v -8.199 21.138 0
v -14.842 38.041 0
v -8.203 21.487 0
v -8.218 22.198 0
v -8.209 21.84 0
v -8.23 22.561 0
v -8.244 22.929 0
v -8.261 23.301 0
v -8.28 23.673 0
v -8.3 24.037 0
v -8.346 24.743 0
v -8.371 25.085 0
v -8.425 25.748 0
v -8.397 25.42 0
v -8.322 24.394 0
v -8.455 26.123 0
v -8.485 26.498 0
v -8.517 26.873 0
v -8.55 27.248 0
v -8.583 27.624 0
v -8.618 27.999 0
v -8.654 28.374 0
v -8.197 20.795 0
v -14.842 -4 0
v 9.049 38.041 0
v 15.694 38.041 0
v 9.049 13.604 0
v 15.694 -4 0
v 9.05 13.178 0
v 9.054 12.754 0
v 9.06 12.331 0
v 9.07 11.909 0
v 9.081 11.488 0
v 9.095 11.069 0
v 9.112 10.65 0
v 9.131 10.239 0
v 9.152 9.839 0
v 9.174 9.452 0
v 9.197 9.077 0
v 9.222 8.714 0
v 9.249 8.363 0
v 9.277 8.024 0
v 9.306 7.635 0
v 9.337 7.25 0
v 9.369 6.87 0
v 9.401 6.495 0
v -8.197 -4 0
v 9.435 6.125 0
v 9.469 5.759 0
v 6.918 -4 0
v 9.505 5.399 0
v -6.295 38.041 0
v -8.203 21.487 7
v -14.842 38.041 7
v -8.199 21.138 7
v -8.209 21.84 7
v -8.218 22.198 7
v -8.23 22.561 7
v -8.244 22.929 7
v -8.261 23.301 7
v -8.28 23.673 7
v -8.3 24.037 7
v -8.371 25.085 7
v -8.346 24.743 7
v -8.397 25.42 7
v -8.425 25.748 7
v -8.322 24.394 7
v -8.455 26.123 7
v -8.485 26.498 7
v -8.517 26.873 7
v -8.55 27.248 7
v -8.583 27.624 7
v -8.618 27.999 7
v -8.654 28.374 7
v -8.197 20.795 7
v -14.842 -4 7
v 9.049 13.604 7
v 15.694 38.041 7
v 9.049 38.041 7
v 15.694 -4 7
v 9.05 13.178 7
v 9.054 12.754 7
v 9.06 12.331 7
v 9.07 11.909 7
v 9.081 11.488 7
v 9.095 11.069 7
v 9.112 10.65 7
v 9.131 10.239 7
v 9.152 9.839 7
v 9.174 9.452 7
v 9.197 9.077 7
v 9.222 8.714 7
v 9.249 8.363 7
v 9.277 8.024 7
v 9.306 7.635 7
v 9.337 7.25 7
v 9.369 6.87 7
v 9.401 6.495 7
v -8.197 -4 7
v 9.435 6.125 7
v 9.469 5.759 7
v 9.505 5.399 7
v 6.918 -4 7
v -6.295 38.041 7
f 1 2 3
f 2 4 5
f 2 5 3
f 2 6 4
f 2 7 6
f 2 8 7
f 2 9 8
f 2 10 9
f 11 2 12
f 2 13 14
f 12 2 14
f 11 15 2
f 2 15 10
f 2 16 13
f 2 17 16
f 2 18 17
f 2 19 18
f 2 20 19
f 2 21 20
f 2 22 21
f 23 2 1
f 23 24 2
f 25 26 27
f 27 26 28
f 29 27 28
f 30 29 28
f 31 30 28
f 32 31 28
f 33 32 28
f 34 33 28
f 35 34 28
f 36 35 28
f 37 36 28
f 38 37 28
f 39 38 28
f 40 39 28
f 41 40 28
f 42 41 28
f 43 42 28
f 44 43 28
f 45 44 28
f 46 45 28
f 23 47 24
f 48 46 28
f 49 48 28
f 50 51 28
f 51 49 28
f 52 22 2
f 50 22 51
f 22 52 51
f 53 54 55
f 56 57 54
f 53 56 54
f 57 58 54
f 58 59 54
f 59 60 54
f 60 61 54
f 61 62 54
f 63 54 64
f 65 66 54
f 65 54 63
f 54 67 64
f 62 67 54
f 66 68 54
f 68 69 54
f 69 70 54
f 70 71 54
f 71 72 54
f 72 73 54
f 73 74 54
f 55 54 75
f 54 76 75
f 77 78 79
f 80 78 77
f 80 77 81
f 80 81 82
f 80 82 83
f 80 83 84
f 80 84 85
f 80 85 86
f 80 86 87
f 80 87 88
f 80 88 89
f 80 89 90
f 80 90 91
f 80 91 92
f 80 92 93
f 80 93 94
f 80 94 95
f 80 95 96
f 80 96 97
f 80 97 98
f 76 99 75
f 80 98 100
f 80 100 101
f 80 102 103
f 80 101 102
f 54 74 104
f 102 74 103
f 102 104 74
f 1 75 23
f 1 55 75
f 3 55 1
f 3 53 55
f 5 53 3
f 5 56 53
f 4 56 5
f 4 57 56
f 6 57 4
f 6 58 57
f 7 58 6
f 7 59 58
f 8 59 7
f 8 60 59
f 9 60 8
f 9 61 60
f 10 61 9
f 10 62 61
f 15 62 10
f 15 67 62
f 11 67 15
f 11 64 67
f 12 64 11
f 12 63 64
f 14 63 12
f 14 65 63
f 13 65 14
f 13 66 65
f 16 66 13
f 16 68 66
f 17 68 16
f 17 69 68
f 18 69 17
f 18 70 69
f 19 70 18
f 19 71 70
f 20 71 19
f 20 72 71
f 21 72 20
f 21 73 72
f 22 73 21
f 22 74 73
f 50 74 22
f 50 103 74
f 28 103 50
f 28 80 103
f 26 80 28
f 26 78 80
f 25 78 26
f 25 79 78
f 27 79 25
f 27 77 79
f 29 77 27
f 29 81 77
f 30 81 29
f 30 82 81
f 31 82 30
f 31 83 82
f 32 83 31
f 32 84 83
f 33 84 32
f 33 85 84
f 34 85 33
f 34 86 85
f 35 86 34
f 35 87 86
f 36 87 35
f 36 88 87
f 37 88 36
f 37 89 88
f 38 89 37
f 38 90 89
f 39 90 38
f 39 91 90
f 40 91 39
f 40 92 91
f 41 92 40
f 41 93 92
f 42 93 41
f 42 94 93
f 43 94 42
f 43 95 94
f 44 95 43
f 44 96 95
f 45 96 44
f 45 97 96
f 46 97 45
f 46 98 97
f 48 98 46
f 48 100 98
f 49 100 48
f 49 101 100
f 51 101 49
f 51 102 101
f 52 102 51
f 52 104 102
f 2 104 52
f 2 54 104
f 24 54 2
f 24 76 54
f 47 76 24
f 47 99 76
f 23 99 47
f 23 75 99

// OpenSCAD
// file: glyph.scad
// glyph — the shared geometry of every letter in the set. Defines named geometry
// only, so it renders nothing on its own; each letter part includes it and calls
// letter(). Every dimension lives in ../../lib/common.scad.
//
// A LETTER IS NOTHING BUT A LETTER. No plinth, no tongue, no tab — it is the
// bare glyph, and it attaches by standing in the deck groove and resting on the
// groove's floor. Anything else on it would be a distraction on a learning toy.
//
// It is a flat plate of one thickness, printed face-down: no overhang anywhere,
// no supports, and the face on the bed comes out smoothest.
//
// TWO TRAPS WITH text():
//
//  * A missing font FALLS BACK SILENTLY — no warning, no error, just different
//    letters. "Liberation Sans" was the first choice here because OpenSCAD
//    bundles it; on macOS the bundled faces are not registered with fontconfig,
//    so it rendered the fallback face instead and nothing said so. To check a
//    font resolved, render a string with it and with a deliberately bogus name
//    and compare bounding boxes: identical means it fell back.
//  * `size` is not the cap height in general. For Helvetica Bold they coincide
//    (size 44 -> 44.0 mm cap), which is why letter_size reads as a height.
//    Change the font and re-measure.

include <../../lib/common.scad>

// The letter's outline, upright in the XY plane, ready to be extruded along Z
// (which is the letter's thickness, and the print's build axis).
//
//   y = 0   is the deck surface
//   y < 0   is the part standing down inside the groove. It reaches letter_bury,
//           which is where the tapered groove closes to letter_t — NOT the
//           groove's floor. The letter wedges; it never bottoms out.
module glyph_2d(ch) {
    intersection() {
        translate([0, -letter_bury])
            scale([letter_condense, 1])
                text(ch, size = letter_size, font = letter_font,
                     halign = "center", valign = "baseline");
        // Trimmed flat at the baseline. Round letters (O, C, G, S) overshoot the
        // baseline by design, and a letter standing on a convex curve rocks —
        // there is nothing to stop it leaning. The trim costs nothing visible
        // and gives every letter a flat foot on the groove floor.
        translate([-200, -letter_bury]) square([400, 400]);
    }
}

// One letter, in its print orientation: lying on its face, thickness up Z.
module letter(ch) {
    linear_extrude(letter_t) glyph_2d(ch);
}

// Where that letter sits once it is dropped into a chassis, for fit checks.
module letter_fitted(ch) {
    translate([0, letter_t/2, body_top]) rotate([90, 0, 0]) letter(ch);
}
// main file
// letter N — one part. See glyph.scad for the geometry and lib/common.scad for
// the dimensions. Prints lying on its face, exactly as exported: no supports.

include <glyph.scad>

letter("N");
